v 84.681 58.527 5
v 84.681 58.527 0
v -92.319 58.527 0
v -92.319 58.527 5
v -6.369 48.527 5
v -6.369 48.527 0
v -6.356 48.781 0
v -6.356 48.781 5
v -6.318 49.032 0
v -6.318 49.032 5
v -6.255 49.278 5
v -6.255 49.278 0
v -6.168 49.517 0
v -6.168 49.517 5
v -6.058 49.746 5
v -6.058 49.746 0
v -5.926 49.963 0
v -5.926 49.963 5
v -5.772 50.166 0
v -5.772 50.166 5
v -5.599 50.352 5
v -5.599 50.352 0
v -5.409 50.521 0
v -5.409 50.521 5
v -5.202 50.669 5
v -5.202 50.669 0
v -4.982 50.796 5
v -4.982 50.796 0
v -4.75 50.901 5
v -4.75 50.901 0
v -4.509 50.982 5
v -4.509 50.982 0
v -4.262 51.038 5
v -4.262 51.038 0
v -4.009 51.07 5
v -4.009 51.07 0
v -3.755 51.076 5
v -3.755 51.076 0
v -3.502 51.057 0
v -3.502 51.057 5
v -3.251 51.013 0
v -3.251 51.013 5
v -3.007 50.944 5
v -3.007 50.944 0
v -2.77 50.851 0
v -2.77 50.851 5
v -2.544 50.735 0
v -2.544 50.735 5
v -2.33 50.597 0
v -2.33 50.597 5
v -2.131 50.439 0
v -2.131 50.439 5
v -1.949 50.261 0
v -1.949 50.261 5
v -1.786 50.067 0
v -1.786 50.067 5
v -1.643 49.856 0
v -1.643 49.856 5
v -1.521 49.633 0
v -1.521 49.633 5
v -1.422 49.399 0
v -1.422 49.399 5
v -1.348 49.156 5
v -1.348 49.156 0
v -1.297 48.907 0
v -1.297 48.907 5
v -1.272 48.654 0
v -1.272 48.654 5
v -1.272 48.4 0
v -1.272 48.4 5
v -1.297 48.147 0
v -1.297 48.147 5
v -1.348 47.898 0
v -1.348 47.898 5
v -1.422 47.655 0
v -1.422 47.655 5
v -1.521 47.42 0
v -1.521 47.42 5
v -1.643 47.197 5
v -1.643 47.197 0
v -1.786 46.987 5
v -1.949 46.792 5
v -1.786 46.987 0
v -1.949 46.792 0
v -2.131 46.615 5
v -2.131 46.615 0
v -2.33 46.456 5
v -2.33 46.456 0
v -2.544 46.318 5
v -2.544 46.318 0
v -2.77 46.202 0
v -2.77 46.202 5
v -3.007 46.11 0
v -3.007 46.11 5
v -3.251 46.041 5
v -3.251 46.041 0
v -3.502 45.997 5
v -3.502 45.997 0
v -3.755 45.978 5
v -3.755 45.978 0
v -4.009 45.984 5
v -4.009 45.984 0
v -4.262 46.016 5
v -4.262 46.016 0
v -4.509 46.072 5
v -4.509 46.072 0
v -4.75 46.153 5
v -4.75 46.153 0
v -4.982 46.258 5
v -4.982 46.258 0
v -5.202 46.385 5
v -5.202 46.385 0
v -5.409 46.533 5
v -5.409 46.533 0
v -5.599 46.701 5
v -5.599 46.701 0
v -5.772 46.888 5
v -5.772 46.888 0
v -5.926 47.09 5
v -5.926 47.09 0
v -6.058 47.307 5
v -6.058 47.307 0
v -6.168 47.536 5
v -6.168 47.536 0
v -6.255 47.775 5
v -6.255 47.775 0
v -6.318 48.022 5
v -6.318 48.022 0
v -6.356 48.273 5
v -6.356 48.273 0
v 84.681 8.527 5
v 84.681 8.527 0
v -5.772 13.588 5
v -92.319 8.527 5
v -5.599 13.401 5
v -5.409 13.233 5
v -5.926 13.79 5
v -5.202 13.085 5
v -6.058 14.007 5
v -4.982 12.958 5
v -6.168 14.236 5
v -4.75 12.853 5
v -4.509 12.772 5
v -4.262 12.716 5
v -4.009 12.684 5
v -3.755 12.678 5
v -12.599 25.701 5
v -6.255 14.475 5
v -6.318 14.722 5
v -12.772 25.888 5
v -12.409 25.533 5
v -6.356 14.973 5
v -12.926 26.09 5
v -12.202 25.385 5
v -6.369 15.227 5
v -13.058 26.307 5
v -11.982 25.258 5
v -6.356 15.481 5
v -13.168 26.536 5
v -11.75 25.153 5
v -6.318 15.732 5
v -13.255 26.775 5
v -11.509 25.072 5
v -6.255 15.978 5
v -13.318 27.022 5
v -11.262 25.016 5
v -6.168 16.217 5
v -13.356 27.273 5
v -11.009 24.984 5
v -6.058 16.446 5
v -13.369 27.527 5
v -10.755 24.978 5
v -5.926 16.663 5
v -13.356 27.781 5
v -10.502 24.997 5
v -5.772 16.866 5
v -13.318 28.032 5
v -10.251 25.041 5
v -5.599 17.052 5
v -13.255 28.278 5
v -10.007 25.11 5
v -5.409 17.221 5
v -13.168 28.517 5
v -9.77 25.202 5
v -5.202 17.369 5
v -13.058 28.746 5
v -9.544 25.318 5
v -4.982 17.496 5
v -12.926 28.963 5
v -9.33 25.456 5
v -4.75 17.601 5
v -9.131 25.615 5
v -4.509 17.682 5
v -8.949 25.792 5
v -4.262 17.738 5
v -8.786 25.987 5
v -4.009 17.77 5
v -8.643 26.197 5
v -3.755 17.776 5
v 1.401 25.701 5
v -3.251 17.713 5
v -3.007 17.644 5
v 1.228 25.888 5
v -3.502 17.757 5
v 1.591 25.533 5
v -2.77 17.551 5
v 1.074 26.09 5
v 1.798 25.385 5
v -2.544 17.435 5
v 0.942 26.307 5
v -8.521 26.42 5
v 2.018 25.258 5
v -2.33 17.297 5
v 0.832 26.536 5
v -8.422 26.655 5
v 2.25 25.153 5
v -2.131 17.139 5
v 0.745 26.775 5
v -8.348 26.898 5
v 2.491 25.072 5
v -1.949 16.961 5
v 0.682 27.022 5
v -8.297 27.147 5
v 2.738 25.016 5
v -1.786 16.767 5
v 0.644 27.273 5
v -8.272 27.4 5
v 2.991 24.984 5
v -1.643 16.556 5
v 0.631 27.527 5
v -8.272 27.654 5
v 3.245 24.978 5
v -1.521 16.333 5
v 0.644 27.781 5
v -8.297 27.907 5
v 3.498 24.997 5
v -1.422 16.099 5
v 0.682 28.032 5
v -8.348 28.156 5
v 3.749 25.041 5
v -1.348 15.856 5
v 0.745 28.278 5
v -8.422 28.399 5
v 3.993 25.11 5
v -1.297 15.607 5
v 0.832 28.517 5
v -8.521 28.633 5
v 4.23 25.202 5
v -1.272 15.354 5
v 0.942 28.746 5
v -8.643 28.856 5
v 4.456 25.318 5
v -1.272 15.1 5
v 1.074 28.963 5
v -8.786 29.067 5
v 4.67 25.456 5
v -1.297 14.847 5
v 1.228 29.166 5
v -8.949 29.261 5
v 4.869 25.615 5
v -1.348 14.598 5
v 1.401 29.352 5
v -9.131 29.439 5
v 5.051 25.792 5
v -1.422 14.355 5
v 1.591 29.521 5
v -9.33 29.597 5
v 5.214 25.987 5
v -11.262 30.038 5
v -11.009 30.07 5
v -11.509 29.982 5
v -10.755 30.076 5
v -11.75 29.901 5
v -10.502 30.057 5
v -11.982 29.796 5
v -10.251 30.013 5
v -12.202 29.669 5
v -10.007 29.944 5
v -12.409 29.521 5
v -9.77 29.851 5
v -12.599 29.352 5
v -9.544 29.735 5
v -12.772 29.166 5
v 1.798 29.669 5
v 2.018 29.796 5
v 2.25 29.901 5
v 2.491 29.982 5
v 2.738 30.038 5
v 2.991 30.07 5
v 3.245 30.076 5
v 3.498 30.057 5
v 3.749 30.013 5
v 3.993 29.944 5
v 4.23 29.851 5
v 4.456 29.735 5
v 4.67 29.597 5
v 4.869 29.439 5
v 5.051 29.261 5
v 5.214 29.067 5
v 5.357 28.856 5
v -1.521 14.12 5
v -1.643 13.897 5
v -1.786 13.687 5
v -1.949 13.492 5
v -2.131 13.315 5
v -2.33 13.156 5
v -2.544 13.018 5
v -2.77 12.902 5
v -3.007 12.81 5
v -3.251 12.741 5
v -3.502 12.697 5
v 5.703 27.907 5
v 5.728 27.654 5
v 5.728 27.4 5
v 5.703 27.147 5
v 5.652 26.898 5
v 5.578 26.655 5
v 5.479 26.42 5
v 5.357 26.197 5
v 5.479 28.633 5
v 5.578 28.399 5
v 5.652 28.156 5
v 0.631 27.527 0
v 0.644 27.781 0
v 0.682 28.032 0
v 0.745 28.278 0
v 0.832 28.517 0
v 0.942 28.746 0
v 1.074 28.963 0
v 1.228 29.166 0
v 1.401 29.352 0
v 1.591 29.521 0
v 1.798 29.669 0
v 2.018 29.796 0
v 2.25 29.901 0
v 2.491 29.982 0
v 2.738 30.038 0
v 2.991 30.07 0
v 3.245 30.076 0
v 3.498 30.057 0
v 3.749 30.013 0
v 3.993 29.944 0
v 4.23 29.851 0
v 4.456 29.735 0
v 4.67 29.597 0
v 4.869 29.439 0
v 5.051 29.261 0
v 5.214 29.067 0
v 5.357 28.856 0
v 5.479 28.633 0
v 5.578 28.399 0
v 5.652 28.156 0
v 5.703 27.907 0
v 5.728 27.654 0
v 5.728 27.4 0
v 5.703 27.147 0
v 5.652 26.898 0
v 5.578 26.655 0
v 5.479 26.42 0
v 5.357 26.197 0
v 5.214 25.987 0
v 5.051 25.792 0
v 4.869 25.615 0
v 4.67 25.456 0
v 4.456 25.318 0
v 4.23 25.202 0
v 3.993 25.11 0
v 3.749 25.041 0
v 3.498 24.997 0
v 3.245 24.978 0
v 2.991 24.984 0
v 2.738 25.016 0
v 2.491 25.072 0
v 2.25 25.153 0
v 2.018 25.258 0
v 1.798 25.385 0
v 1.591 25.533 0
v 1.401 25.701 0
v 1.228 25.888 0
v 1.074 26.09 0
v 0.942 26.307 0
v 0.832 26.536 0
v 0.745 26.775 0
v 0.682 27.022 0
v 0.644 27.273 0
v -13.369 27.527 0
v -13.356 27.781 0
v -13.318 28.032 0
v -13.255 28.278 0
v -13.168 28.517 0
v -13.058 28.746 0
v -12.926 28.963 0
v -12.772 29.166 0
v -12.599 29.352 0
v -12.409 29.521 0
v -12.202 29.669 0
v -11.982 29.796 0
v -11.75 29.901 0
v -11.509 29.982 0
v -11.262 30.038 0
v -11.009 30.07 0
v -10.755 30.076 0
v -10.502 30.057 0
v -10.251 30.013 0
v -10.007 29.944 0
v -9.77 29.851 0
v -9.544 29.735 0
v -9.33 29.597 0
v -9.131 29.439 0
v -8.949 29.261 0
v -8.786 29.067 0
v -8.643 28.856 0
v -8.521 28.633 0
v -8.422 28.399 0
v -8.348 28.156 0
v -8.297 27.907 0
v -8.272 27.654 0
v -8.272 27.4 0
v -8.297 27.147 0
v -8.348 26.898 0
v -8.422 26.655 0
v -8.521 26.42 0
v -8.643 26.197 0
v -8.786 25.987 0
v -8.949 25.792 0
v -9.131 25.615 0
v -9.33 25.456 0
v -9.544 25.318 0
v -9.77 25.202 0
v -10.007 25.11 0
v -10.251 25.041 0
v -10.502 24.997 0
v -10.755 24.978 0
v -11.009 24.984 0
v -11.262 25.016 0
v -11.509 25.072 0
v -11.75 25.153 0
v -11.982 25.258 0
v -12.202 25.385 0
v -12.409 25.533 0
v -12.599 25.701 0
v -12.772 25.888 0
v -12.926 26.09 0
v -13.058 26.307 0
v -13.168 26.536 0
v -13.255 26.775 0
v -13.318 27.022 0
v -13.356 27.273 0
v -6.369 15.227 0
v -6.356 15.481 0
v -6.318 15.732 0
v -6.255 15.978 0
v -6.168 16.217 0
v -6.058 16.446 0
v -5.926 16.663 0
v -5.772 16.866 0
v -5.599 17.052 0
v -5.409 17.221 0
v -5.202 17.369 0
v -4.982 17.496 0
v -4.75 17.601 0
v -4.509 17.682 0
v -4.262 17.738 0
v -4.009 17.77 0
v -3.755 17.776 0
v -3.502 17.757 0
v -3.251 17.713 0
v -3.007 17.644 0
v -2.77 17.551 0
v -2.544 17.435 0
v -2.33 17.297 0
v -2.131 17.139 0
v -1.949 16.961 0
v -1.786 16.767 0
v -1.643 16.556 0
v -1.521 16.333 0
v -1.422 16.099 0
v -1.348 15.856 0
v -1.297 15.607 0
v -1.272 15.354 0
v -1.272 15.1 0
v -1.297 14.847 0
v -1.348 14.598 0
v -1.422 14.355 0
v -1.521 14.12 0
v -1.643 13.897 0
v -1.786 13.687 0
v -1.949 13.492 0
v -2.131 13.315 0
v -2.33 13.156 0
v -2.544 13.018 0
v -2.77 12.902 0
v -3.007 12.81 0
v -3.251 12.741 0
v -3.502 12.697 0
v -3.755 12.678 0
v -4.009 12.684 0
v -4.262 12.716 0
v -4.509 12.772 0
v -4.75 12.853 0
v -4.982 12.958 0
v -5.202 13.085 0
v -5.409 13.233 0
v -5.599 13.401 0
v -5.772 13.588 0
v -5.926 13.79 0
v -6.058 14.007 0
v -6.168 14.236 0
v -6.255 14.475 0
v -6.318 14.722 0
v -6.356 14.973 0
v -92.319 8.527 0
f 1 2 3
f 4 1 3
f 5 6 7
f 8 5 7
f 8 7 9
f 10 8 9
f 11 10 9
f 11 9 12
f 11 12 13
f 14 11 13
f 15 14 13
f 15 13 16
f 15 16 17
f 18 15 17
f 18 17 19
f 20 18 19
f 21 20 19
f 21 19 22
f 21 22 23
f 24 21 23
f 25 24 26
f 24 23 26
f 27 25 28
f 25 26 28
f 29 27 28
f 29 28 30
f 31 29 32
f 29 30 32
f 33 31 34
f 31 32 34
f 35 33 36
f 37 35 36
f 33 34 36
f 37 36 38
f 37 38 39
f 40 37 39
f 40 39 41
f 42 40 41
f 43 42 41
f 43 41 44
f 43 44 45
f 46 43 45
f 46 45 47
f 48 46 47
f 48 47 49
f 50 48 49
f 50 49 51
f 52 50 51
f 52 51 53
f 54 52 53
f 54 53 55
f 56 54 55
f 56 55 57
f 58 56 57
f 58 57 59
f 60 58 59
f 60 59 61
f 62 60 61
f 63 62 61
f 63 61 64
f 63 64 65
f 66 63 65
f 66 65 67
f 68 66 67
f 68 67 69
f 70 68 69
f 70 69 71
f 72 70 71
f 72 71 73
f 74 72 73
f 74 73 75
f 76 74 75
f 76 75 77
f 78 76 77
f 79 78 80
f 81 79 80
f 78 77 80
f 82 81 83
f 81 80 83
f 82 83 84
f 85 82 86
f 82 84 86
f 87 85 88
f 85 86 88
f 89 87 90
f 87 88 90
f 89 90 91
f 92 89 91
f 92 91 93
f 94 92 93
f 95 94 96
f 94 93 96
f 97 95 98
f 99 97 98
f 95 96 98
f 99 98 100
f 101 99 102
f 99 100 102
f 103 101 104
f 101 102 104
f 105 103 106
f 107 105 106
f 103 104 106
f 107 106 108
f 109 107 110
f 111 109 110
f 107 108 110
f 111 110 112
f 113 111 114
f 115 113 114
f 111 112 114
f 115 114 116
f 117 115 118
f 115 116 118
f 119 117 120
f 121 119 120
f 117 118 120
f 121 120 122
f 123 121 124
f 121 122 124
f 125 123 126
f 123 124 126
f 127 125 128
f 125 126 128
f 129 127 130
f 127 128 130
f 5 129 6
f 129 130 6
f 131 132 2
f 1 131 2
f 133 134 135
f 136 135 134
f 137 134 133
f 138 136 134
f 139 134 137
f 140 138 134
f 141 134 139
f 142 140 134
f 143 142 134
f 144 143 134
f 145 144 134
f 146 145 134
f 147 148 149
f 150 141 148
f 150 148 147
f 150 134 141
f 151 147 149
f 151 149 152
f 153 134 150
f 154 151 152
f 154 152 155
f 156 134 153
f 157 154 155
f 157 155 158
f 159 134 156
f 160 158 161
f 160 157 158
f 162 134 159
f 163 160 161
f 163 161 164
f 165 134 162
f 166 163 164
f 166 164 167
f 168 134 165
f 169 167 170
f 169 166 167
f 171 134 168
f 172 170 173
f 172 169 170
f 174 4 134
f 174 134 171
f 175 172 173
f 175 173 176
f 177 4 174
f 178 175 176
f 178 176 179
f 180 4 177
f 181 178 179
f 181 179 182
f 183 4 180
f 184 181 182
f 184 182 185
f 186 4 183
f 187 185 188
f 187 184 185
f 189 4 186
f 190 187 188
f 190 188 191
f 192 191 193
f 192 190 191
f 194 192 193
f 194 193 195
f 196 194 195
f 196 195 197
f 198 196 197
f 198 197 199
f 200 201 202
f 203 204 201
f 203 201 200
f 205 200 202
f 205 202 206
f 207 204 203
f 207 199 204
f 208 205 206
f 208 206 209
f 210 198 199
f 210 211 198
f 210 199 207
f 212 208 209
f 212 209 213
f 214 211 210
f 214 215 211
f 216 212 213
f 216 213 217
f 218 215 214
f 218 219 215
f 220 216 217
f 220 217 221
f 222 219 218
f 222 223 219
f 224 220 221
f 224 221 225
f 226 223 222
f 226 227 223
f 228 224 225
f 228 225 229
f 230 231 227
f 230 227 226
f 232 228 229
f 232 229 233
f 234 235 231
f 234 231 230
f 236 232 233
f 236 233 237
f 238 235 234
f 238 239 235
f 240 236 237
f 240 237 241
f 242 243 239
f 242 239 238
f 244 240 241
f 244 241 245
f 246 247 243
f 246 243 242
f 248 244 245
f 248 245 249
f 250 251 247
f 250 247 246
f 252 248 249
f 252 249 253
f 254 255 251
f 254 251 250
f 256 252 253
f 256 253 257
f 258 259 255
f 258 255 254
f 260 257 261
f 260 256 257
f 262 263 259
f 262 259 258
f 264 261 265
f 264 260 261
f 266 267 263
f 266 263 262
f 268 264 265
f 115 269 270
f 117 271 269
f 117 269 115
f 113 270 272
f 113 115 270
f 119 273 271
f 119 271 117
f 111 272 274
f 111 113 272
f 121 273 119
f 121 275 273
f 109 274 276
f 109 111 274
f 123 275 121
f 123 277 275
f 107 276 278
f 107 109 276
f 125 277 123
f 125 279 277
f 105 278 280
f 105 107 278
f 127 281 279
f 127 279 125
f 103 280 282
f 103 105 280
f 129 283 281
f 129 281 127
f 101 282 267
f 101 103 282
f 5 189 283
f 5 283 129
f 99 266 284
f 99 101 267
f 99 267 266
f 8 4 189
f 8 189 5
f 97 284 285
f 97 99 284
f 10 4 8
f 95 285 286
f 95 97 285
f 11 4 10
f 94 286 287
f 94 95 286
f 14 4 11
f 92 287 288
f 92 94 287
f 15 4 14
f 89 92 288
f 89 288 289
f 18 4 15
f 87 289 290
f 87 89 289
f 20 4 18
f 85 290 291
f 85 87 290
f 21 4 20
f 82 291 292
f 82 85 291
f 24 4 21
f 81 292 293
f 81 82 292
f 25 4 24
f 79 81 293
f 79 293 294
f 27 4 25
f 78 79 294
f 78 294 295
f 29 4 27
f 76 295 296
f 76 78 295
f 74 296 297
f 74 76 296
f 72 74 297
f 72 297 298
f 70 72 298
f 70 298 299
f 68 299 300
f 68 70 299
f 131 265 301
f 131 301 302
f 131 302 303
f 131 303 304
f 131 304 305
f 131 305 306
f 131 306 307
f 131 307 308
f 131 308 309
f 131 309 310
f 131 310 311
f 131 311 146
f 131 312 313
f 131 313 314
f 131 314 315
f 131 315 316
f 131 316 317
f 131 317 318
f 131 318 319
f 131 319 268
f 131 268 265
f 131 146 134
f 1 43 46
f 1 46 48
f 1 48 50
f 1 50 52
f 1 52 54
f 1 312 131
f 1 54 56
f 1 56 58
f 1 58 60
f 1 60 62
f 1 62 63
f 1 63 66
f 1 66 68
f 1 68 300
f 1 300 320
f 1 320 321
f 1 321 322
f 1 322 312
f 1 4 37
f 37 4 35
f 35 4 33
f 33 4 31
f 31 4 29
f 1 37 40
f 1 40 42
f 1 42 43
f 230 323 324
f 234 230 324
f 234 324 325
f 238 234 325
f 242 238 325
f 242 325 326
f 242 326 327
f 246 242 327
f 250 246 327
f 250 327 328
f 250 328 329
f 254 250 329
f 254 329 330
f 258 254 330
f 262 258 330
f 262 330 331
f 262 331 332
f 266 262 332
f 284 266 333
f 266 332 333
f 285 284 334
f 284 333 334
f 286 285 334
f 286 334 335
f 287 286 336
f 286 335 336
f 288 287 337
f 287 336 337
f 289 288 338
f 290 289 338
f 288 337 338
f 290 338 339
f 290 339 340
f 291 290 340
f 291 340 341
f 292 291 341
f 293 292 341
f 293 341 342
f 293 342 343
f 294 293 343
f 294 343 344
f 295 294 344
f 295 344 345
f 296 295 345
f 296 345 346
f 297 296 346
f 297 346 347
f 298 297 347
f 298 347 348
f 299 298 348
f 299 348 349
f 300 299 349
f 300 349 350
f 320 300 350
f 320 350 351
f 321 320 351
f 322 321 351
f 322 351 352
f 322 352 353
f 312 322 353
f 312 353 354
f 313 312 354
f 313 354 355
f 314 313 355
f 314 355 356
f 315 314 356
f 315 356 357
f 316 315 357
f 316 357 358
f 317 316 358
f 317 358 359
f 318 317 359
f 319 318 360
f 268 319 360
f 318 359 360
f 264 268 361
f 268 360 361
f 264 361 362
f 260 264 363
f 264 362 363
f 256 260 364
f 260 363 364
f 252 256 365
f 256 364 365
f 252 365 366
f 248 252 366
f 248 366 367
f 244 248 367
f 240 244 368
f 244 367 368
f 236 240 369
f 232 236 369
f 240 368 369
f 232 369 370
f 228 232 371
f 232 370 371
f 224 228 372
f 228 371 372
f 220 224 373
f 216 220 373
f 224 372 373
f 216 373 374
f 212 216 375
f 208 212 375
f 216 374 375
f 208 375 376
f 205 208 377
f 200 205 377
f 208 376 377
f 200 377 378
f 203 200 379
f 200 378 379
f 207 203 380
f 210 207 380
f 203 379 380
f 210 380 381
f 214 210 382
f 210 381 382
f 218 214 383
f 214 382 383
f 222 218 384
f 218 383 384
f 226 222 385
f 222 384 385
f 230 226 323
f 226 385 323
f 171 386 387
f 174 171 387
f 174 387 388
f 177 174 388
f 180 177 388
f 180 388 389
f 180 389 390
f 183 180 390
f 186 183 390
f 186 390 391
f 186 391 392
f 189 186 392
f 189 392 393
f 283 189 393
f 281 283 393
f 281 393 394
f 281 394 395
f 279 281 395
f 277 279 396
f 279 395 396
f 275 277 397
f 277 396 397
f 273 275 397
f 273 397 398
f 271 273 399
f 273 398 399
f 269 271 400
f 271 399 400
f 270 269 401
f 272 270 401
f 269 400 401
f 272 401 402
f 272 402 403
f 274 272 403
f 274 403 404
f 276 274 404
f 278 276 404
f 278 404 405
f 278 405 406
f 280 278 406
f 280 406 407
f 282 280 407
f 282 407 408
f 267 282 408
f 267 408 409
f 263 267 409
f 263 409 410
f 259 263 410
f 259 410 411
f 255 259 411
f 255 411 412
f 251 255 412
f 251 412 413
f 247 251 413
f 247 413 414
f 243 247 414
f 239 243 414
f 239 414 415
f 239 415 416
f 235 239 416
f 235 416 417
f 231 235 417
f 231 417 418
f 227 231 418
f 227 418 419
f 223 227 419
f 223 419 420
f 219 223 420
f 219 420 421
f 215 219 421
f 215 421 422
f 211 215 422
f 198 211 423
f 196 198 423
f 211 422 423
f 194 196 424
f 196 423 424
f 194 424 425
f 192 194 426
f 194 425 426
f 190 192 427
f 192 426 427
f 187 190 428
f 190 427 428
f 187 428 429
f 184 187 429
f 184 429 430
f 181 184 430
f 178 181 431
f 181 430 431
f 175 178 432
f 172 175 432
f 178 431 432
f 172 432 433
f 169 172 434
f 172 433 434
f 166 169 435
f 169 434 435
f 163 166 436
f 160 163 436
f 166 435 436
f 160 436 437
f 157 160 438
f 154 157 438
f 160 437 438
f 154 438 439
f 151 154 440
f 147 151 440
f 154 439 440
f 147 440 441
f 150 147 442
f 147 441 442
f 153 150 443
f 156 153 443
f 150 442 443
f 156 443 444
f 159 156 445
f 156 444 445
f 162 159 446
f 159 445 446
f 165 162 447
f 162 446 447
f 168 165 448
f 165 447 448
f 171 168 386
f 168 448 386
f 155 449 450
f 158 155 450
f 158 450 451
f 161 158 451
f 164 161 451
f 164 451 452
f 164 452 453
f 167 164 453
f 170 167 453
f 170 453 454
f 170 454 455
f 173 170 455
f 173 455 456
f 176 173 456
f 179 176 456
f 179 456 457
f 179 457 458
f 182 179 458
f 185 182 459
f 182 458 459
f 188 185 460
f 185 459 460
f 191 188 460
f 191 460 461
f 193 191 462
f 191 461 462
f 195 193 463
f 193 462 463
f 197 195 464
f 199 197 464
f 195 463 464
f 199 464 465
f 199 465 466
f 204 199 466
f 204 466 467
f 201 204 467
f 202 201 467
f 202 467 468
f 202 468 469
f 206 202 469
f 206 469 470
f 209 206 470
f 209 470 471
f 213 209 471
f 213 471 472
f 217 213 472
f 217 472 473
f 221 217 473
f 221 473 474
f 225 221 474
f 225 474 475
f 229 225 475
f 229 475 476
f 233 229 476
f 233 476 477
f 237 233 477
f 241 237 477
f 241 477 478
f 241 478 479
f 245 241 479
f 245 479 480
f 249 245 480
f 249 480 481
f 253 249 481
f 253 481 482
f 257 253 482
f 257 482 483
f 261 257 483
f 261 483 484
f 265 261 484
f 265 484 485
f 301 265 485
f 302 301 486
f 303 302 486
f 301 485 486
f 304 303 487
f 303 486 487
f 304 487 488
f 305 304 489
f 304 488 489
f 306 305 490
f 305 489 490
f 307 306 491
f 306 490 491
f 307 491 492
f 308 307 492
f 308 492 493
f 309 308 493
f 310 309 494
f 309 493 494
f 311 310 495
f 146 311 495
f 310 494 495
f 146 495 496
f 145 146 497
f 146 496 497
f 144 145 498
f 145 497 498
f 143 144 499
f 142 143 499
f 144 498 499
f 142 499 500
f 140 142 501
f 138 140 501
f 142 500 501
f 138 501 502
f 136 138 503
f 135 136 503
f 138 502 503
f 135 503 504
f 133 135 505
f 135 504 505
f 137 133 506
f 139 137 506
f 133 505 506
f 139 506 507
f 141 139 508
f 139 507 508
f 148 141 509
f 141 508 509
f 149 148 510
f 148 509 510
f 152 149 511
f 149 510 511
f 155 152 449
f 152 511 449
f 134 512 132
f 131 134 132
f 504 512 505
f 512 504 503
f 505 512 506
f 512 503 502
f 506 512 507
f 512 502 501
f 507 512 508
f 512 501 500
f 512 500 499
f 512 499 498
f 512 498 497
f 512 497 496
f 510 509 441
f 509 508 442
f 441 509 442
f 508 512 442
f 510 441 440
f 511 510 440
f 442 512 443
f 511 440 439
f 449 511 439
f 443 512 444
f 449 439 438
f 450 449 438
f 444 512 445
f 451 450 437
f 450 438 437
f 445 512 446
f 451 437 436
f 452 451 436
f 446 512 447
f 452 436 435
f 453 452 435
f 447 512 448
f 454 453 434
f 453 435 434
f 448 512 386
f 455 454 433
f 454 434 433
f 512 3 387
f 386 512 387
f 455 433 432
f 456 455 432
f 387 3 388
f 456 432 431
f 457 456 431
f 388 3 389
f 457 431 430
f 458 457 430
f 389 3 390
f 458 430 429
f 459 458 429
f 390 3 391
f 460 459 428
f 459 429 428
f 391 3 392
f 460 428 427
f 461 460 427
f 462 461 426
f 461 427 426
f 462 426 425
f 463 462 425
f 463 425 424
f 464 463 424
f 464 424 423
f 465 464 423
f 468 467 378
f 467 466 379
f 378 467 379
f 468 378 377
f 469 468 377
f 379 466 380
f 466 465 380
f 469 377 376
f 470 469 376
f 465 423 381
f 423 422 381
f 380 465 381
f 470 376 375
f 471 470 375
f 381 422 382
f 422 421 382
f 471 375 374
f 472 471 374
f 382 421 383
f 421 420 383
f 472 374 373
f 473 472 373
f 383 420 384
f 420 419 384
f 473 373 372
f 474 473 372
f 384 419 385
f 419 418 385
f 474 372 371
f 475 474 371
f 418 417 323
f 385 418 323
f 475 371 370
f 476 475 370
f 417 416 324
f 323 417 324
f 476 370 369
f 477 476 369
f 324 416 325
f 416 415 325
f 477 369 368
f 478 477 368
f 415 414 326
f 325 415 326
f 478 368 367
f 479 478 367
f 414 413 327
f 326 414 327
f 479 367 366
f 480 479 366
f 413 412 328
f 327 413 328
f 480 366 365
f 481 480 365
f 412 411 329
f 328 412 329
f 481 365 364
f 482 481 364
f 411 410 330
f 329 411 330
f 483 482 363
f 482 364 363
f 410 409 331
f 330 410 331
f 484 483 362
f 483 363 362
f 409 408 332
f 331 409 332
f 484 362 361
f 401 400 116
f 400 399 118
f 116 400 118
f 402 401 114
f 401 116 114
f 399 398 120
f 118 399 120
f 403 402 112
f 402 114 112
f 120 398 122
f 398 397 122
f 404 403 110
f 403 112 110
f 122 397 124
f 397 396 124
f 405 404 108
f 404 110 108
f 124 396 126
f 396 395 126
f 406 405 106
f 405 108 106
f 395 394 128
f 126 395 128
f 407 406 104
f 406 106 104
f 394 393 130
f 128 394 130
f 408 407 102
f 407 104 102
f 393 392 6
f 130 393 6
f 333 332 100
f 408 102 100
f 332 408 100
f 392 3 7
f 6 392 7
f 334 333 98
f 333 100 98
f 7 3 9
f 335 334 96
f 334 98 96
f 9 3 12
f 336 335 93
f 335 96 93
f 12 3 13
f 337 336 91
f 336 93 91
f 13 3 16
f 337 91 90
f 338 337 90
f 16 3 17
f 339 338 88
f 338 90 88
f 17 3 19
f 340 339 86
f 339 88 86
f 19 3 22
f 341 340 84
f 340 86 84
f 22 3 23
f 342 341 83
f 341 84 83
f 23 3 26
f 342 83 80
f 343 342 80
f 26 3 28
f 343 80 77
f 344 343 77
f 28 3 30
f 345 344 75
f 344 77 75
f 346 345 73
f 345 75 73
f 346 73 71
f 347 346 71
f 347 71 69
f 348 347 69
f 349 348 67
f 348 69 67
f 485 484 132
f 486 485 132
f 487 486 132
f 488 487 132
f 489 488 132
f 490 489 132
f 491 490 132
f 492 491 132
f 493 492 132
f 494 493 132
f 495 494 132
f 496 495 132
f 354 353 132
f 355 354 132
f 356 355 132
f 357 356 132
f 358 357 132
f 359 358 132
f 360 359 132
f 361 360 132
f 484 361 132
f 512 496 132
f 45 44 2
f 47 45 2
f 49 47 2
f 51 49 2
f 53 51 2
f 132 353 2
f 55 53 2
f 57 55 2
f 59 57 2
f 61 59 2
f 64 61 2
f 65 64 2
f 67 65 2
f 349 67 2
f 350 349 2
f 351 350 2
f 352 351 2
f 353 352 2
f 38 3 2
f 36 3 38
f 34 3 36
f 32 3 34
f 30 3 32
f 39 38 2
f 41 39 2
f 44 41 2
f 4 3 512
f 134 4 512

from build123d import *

# Parameters (mm, degrees)
F1_DEPTH = 5
F3_D     = 5.1
F4_R     = 2.1
F5_DEPTH = 25


with BuildPart() as f1:
    # F0 (on Top) → F1 (new body)
    with BuildSketch(Plane.XY):
        Polygon((84.6812899327, 58.5268347502), (-92.3187100673, 58.5268347502), (-92.3187100673, 8.5268347502), (-44.3187100673, 8.5268347502), (36.6812899327, 8.5268347502), (84.6812899327, 8.5268347502), align=None)
    extrude(amount=F1_DEPTH)

    # F3 (through all)
    with Locations(Plane.XY.offset(5)):
        with Locations((-10.8187100673, 27.5268347502), (-3.8187100673, 48.5268347502), (3.1812899327, 27.5268347502), (-3.8187100673, 15.2268347502)):
            Hole(F3_D / 2)

    # F4 (on face) → F5 (cut)
    with BuildSketch(Plane.XY.offset(5)):
        with Locations((-63.3187100673, -6.4731652498)):
            Circle(F4_R)
        with Locations((55.6812899327, -14.4731652498)):
            Circle(F4_R)
        with Locations((-83.3187100673, -14.4731652498)):
            Circle(F4_R)
        with Locations((-73.3187100673, -43.9731652498)):
            Circle(F4_R)
        with Locations((75.6812899327, -6.4731652498)):
            Circle(F4_R)
        with Locations((65.6812899327, -43.9731652498)):
            Circle(F4_R)
    extrude(amount=-F5_DEPTH, mode=Mode.SUBTRACT)


solid = f1.part
